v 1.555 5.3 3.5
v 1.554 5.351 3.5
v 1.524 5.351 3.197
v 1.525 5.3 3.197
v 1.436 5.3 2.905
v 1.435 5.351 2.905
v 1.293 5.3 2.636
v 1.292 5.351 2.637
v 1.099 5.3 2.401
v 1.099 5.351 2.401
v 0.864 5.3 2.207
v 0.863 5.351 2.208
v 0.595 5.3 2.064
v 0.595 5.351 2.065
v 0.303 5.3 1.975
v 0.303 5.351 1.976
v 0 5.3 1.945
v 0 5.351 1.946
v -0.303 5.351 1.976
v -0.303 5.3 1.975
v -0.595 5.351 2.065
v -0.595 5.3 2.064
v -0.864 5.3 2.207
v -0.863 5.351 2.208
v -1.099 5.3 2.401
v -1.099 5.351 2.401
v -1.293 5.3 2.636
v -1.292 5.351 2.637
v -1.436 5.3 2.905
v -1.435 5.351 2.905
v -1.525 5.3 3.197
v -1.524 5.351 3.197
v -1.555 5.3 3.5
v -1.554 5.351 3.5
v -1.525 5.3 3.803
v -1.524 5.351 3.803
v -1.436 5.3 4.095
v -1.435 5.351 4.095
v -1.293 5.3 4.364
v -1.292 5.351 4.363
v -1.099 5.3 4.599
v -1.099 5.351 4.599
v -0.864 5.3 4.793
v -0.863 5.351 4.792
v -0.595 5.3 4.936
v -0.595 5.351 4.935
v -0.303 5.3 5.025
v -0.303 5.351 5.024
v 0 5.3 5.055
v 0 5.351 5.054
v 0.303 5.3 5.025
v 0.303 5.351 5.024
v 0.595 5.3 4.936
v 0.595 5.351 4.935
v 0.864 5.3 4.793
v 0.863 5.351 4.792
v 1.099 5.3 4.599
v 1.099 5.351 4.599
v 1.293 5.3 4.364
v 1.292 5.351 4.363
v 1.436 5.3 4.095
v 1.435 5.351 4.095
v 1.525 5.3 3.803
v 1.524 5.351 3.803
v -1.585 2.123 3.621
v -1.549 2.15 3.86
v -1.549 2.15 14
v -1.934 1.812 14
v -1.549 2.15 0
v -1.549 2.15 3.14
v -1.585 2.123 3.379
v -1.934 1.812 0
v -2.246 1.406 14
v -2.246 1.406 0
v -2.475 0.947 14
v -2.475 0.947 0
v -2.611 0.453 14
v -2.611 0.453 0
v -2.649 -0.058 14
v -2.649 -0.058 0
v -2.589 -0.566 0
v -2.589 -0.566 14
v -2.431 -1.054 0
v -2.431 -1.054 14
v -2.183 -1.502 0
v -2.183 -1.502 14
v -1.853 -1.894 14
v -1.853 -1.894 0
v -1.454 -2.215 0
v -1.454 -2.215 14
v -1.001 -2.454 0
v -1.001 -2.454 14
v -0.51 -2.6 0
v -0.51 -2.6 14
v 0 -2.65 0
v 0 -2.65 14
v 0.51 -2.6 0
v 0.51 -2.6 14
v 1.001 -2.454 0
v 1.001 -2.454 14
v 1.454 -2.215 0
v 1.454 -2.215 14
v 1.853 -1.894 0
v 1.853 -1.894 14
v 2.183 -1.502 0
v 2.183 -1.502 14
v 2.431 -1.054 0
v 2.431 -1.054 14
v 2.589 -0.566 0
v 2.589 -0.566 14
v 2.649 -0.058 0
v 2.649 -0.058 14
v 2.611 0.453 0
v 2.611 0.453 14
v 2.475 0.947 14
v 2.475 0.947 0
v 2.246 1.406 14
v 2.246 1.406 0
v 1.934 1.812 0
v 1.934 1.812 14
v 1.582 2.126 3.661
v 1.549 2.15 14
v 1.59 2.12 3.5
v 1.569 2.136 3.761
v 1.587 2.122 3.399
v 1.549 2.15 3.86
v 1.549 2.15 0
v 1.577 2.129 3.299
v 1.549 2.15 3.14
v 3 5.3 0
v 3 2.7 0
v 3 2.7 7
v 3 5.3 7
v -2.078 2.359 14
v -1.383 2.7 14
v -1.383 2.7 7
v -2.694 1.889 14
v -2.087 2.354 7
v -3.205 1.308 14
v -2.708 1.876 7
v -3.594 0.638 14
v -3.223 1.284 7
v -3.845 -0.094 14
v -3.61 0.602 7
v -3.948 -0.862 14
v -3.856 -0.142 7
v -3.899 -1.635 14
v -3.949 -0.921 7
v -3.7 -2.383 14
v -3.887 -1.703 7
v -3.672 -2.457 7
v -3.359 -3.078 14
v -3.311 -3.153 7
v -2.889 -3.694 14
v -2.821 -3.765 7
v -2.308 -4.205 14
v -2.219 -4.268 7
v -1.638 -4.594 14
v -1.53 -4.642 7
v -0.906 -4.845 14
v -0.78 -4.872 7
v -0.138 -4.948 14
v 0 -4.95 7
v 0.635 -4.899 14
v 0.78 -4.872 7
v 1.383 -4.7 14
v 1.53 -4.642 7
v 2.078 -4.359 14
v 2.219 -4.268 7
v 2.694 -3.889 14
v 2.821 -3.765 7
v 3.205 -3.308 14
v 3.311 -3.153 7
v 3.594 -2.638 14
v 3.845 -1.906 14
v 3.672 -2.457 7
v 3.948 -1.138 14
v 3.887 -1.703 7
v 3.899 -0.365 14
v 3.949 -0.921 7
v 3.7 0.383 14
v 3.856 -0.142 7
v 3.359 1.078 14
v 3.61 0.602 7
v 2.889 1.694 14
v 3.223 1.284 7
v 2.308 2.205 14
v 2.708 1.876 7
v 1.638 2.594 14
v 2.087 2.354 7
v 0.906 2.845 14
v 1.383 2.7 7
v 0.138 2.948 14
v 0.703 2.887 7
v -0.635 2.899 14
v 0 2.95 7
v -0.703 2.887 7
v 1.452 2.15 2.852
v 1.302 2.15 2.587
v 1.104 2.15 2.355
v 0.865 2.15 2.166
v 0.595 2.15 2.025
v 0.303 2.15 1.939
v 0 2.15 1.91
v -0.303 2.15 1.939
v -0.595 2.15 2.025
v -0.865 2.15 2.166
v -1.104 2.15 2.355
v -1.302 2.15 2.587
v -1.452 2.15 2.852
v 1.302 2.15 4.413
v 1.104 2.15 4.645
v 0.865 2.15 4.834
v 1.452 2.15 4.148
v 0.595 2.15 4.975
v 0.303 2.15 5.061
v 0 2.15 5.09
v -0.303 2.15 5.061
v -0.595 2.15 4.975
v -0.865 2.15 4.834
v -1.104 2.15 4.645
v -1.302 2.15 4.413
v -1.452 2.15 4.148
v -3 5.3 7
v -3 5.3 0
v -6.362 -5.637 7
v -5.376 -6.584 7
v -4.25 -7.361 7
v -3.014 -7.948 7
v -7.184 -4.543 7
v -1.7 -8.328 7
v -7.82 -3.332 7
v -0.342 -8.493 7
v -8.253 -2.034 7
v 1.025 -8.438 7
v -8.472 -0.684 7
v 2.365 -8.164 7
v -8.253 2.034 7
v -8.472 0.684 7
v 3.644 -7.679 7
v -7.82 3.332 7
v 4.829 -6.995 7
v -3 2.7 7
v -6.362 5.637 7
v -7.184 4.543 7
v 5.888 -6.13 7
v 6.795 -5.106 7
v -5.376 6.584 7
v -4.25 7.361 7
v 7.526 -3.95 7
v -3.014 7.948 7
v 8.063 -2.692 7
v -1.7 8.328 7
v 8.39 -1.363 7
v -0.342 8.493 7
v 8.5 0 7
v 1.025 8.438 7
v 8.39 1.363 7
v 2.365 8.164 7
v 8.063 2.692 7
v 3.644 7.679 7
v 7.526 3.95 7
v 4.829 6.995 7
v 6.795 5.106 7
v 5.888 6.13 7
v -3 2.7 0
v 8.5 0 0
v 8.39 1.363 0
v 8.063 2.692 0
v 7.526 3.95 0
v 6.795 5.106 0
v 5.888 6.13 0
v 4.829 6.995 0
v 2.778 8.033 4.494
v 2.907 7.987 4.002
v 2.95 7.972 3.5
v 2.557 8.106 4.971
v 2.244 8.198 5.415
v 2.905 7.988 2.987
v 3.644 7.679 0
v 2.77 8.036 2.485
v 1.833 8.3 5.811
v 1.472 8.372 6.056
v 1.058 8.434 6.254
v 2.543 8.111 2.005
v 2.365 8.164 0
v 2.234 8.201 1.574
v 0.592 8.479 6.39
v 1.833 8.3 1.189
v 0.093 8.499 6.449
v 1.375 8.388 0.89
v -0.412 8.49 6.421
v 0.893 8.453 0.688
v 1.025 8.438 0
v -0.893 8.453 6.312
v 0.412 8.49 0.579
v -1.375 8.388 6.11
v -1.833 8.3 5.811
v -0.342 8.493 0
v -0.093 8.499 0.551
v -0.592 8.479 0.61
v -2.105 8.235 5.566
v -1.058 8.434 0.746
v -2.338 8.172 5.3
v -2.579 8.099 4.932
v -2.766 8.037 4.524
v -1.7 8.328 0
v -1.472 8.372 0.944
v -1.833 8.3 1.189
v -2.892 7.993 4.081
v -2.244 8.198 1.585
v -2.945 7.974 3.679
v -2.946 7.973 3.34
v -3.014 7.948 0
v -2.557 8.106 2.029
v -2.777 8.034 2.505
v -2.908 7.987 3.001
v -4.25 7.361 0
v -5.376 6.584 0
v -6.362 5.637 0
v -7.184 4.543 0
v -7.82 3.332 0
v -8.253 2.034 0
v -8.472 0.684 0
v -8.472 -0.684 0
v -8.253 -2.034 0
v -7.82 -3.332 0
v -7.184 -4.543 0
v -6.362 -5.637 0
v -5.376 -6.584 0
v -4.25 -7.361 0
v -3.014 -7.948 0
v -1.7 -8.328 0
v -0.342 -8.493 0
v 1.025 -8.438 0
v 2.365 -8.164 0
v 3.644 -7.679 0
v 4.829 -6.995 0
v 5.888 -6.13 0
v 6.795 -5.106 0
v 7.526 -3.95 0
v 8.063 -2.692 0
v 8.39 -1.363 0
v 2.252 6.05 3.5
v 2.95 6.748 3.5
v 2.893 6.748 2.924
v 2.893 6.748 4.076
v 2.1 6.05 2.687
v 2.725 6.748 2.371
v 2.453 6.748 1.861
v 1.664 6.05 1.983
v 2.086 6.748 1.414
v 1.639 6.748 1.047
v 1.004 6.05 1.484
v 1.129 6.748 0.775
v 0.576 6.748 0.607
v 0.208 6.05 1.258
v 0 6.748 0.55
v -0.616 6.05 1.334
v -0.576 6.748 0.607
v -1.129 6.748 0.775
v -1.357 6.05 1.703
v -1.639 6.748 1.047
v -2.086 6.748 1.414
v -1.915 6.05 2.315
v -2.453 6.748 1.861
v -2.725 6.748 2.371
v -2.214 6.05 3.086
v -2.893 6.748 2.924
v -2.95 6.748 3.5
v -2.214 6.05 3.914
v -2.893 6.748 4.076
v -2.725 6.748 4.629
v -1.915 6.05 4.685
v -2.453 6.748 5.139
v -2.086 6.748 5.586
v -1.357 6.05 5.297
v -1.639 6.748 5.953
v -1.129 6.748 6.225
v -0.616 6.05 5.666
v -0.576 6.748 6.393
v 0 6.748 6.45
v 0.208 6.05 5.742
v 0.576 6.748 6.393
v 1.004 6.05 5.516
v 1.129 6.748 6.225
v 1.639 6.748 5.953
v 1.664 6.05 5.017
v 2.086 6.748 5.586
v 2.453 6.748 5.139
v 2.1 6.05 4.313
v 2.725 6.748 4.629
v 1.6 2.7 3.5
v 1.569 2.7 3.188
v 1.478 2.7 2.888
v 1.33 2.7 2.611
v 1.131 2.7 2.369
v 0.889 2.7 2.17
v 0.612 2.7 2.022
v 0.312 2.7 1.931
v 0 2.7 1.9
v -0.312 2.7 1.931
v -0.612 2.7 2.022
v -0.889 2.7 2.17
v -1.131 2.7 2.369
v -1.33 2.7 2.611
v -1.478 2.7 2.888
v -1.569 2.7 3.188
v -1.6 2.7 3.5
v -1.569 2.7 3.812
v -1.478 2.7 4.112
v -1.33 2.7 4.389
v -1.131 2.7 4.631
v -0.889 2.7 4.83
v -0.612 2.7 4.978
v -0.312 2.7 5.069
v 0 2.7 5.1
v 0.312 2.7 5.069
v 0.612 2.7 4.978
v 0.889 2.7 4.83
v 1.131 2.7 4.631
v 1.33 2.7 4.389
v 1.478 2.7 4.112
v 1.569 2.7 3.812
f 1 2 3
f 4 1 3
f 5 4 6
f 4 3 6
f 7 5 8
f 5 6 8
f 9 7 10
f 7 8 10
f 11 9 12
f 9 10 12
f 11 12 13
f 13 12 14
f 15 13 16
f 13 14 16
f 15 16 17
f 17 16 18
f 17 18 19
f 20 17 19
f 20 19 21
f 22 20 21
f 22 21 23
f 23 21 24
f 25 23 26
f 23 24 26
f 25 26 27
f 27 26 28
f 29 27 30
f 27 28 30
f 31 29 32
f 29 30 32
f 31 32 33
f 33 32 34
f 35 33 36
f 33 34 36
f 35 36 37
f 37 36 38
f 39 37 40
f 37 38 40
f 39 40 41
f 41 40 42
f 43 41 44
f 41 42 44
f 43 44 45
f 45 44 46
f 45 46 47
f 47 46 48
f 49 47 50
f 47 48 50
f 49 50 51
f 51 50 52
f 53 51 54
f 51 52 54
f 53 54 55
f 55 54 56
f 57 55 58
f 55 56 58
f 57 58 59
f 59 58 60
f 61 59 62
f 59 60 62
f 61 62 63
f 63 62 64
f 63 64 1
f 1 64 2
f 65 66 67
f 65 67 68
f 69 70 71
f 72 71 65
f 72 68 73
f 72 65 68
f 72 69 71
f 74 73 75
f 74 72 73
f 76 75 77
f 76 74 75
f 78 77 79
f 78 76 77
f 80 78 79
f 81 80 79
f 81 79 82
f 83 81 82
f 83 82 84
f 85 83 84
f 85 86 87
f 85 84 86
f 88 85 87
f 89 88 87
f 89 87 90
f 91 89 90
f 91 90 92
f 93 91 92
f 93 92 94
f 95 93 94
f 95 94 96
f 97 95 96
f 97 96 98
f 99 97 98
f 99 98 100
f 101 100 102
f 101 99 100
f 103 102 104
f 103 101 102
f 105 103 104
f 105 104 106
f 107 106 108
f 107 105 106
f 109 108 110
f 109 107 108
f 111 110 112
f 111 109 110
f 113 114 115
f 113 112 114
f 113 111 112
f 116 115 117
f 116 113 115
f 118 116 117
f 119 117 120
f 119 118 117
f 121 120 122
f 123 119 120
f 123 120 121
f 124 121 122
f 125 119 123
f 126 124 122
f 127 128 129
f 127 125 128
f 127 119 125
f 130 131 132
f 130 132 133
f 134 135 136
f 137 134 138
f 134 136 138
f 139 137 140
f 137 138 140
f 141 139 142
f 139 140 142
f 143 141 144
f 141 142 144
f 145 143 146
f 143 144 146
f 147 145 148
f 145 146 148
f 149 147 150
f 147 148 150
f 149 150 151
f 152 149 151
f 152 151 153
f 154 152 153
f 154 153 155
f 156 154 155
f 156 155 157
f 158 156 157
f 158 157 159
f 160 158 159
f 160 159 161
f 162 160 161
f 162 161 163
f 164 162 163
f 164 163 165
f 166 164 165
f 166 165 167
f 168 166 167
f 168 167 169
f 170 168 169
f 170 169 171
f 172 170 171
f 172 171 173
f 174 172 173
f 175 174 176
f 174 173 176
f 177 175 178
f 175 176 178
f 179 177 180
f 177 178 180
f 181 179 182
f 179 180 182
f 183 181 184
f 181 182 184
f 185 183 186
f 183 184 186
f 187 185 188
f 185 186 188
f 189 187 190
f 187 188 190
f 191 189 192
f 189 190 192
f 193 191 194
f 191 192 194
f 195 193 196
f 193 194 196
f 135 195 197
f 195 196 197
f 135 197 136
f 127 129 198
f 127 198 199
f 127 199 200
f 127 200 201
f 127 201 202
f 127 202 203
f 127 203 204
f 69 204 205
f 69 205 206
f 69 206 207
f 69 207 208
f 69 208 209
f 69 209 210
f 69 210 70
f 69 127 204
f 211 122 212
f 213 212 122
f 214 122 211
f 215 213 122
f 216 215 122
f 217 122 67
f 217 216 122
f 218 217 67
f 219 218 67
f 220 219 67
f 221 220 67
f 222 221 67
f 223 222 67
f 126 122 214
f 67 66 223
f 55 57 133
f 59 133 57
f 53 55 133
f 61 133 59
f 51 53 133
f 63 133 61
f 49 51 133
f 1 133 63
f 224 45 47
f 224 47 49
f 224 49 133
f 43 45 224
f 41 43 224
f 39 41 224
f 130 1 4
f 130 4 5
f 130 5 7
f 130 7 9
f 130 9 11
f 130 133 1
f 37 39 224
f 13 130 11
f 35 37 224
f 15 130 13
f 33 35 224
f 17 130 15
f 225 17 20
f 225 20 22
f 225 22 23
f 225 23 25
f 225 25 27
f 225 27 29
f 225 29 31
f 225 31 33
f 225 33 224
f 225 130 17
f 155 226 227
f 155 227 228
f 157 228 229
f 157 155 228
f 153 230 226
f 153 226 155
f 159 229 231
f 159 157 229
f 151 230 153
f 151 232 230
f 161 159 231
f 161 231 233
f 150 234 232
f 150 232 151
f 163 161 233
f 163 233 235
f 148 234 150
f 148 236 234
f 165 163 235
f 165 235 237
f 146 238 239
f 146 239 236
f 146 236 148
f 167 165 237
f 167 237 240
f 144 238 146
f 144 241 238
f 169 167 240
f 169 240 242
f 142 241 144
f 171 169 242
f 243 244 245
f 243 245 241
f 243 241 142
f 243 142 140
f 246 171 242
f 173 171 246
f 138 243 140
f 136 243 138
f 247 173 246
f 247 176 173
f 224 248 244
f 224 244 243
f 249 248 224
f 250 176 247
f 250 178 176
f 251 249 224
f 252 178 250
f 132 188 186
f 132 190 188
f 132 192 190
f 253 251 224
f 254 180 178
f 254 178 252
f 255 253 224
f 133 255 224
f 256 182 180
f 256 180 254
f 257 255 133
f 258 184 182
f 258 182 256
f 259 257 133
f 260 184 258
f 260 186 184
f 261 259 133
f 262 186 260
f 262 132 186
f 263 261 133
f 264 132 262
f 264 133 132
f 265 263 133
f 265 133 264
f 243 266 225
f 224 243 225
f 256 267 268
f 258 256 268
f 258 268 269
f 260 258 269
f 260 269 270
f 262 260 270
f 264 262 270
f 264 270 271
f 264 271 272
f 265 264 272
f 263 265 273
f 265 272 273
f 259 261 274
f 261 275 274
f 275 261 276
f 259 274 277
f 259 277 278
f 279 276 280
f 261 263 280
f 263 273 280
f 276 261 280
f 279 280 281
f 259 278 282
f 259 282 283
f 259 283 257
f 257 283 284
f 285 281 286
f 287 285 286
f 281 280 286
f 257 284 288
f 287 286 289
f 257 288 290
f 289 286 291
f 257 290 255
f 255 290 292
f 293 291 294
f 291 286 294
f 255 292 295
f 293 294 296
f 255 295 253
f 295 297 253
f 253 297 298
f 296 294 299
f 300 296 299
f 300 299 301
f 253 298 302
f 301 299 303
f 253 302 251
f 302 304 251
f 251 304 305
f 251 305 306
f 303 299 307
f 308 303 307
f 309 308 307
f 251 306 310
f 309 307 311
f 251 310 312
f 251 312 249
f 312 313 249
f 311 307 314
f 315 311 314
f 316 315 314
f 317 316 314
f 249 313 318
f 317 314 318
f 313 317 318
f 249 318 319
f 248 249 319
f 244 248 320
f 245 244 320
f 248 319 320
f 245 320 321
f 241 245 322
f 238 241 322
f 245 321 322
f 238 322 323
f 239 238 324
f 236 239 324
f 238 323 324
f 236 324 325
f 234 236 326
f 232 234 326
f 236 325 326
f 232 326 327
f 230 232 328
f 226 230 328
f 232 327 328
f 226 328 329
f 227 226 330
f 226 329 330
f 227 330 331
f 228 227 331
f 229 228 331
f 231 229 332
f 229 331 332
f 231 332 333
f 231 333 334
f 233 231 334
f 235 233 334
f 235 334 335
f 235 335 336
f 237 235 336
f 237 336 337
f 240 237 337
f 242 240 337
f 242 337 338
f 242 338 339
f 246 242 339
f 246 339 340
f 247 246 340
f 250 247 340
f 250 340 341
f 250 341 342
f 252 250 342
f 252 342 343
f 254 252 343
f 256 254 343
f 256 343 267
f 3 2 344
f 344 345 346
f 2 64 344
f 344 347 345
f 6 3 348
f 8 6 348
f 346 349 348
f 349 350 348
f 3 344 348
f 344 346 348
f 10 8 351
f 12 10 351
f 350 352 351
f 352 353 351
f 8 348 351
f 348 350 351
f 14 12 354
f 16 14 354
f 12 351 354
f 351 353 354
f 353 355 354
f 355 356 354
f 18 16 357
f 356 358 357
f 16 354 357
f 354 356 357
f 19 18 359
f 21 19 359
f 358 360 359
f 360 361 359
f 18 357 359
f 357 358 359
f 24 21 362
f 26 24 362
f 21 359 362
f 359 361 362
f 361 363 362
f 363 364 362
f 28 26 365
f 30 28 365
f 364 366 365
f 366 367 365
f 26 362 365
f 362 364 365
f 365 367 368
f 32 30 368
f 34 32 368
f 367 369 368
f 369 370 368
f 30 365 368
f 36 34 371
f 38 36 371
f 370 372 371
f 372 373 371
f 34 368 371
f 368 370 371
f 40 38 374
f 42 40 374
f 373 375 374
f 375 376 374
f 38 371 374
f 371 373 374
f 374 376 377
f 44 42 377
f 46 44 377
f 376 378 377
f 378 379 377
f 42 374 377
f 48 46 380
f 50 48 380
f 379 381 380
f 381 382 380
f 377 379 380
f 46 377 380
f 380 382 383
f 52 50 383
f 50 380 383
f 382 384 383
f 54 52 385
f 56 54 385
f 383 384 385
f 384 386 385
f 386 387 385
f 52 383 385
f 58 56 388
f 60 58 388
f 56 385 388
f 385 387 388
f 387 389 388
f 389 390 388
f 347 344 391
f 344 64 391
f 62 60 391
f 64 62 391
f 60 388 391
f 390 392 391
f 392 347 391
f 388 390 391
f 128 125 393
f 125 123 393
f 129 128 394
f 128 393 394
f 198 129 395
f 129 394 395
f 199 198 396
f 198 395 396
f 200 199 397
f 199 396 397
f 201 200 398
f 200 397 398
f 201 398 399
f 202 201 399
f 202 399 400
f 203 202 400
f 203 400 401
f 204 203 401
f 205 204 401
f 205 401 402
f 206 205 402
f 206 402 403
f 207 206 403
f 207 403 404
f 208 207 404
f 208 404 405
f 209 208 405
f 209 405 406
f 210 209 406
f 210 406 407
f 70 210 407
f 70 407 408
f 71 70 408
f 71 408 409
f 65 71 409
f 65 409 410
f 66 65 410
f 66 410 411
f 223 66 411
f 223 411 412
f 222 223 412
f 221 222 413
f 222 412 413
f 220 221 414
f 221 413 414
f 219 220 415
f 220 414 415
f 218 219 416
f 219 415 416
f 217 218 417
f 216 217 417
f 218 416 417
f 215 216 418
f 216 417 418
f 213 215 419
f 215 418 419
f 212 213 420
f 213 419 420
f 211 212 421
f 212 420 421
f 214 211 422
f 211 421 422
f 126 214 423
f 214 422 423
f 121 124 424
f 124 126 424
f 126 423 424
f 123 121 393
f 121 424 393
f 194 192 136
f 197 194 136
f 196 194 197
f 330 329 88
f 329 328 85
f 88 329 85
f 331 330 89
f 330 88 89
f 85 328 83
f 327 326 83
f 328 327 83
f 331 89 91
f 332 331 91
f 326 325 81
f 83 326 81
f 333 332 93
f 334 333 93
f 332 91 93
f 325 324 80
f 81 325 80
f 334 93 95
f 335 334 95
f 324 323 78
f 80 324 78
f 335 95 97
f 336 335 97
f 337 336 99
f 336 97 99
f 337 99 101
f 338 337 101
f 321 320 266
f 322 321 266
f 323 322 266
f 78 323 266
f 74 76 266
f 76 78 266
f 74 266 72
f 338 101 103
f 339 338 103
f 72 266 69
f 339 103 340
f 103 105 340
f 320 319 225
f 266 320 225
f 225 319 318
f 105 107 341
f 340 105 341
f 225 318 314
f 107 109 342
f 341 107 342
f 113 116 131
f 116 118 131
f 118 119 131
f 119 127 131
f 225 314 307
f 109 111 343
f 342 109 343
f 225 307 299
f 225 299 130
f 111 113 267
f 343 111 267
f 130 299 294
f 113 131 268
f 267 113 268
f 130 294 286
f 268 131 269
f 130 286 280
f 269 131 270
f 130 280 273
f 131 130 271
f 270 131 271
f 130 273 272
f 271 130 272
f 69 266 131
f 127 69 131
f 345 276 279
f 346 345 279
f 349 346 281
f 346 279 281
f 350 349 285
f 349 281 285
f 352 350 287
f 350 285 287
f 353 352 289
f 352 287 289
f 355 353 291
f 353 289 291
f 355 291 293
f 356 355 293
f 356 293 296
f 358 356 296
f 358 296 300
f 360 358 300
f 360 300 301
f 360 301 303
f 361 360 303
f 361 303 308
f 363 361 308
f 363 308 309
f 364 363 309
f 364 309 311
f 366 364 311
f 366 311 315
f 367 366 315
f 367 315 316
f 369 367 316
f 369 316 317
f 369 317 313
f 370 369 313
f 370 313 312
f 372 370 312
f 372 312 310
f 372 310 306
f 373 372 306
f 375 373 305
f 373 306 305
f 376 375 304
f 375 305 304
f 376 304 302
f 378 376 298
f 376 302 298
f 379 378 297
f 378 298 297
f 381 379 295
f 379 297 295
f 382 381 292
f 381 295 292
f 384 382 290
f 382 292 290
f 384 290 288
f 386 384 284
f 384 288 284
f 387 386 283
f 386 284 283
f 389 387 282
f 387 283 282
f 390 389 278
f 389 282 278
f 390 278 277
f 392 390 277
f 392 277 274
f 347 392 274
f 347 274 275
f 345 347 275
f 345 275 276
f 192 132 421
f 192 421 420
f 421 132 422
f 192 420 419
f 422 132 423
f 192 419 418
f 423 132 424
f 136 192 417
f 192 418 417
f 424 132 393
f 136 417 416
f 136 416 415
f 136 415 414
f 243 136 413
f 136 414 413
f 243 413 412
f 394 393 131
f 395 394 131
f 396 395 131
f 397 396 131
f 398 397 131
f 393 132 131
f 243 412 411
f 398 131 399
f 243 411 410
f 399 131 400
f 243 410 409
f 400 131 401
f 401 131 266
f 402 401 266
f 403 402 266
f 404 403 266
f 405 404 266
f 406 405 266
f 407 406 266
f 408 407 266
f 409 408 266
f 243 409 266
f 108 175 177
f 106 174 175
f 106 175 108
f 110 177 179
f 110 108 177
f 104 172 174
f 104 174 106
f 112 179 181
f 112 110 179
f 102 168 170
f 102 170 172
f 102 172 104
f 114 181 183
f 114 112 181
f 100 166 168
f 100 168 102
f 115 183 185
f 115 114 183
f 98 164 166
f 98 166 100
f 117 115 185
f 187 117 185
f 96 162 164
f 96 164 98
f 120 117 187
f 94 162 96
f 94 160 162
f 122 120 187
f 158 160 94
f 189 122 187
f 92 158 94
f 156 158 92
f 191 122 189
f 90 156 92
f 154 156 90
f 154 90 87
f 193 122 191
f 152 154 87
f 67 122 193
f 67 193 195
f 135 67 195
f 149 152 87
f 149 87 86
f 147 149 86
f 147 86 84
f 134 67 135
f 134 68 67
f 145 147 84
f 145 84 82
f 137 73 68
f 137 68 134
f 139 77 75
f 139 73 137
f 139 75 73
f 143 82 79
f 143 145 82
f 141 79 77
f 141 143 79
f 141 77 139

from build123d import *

# Parameters (mm, degrees)
ESQUISSE1_R             = 8.5
BOSS_EXTRU_1_DEPTH      = 7
ESQUISSE2_W             = 6
ESQUISSE2_H             = 2.6
ENL_V_MAT_EXTRU_1_DEPTH = 14.910427743
ESQUISSE7_R             = 2.95
ENL_V_MAT_EXTRU_8_DEPTH = 21.087060672
ESQUISSE9_R             = 3.95
BOSS_EXTRU_2_DEPTH      = 7
ENL_V_MAT_EXTRU_9_DEPTH = 19.45264218


with BuildPart() as part:
    # Esquisse1 → Boss.-Extru.1 (new body)
    with BuildSketch(Plane.XY):
        Circle(ESQUISSE1_R)
    extrude(amount=BOSS_EXTRU_1_DEPTH)

    # Esquisse2 → Enlèv. mat.-Extru.1 (cut, through all)
    with BuildSketch(Plane(origin=(0, 0, 0), x_dir=(-1, 0, 0), z_dir=(0, 0, -1))):
        with Locations((0, 4)):
            Rectangle(ESQUISSE2_W, ESQUISSE2_H)
    extrude(amount=-ENL_V_MAT_EXTRU_1_DEPTH, mode=Mode.SUBTRACT)

    # Enlèv. mat.-Extru.2: read off the stored shape, not the designer's step
    # Enlèv. mat.-Extru.2 outline → Enlèv. mat.-Extru.2 (revolve, cut)
    with BuildSketch(Plane.XY.offset(3.5)):
        Polygon((0, 5.3), (1.554616831, 5.3), (1.498760014, 8.500034923), (0, 8.500034923), align=None)
        Polygon((1.6, 2.7), (0, 2.7), (0, 0.7), (1.56508987, 0.7), align=None)
    revolve(axis=Axis((0, 0, 3.5), (0, 1, 0)), mode=Mode.SUBTRACT)

    # Esquisse7 → Enlèv. mat.-Extru.8 (cut, through all)
    with BuildSketch(Plane(origin=(0, 8.3, 0), x_dir=(1, 0, 0), z_dir=(0, 1, 0))):
        with Locations((0, -3.5)):
            Circle(ESQUISSE7_R)
    extrude(amount=ENL_V_MAT_EXTRU_8_DEPTH, mode=Mode.SUBTRACT)

    # Chanfrein1: read off the stored shape, not the designer's step
    # Chanfrein1 outline → Chanfrein1 (revolve, cut)
    with BuildSketch(Plane.XY.offset(3.5)):
        Polygon((2.95, 6.747748364), (2.95, 8.3), (1.502251636, 8.3), (1.553718474, 5.351466838), align=None)
    revolve(axis=Axis((0, 0, 3.5), (0, 1, 0)), mode=Mode.SUBTRACT)

    # Esquisse9 → Boss.-Extru.2 (add)
    with BuildSketch(Plane.XY.offset(7)):
        with Locations(Location((0, -1, 0), (0, 0, 110.493999506))):
            Circle(ESQUISSE9_R)
    extrude(amount=BOSS_EXTRU_2_DEPTH)

    # Esquisse10 → Enlèv. mat.-Extru.9 (cut, through all)
    with BuildSketch(Plane(origin=(0, 0, 0), x_dir=(-1, 0, 0), z_dir=(0, 0, -1))):
        with BuildLine():
            Line((-1.549193338, 2.15), (1.549193338, 2.15))
            ThreePointArc((1.549193338, 2.15), (0, -2.65), (-1.549193338, 2.15))
        make_face()
    extrude(amount=-ENL_V_MAT_EXTRU_9_DEPTH, mode=Mode.SUBTRACT)


solid = part.part
